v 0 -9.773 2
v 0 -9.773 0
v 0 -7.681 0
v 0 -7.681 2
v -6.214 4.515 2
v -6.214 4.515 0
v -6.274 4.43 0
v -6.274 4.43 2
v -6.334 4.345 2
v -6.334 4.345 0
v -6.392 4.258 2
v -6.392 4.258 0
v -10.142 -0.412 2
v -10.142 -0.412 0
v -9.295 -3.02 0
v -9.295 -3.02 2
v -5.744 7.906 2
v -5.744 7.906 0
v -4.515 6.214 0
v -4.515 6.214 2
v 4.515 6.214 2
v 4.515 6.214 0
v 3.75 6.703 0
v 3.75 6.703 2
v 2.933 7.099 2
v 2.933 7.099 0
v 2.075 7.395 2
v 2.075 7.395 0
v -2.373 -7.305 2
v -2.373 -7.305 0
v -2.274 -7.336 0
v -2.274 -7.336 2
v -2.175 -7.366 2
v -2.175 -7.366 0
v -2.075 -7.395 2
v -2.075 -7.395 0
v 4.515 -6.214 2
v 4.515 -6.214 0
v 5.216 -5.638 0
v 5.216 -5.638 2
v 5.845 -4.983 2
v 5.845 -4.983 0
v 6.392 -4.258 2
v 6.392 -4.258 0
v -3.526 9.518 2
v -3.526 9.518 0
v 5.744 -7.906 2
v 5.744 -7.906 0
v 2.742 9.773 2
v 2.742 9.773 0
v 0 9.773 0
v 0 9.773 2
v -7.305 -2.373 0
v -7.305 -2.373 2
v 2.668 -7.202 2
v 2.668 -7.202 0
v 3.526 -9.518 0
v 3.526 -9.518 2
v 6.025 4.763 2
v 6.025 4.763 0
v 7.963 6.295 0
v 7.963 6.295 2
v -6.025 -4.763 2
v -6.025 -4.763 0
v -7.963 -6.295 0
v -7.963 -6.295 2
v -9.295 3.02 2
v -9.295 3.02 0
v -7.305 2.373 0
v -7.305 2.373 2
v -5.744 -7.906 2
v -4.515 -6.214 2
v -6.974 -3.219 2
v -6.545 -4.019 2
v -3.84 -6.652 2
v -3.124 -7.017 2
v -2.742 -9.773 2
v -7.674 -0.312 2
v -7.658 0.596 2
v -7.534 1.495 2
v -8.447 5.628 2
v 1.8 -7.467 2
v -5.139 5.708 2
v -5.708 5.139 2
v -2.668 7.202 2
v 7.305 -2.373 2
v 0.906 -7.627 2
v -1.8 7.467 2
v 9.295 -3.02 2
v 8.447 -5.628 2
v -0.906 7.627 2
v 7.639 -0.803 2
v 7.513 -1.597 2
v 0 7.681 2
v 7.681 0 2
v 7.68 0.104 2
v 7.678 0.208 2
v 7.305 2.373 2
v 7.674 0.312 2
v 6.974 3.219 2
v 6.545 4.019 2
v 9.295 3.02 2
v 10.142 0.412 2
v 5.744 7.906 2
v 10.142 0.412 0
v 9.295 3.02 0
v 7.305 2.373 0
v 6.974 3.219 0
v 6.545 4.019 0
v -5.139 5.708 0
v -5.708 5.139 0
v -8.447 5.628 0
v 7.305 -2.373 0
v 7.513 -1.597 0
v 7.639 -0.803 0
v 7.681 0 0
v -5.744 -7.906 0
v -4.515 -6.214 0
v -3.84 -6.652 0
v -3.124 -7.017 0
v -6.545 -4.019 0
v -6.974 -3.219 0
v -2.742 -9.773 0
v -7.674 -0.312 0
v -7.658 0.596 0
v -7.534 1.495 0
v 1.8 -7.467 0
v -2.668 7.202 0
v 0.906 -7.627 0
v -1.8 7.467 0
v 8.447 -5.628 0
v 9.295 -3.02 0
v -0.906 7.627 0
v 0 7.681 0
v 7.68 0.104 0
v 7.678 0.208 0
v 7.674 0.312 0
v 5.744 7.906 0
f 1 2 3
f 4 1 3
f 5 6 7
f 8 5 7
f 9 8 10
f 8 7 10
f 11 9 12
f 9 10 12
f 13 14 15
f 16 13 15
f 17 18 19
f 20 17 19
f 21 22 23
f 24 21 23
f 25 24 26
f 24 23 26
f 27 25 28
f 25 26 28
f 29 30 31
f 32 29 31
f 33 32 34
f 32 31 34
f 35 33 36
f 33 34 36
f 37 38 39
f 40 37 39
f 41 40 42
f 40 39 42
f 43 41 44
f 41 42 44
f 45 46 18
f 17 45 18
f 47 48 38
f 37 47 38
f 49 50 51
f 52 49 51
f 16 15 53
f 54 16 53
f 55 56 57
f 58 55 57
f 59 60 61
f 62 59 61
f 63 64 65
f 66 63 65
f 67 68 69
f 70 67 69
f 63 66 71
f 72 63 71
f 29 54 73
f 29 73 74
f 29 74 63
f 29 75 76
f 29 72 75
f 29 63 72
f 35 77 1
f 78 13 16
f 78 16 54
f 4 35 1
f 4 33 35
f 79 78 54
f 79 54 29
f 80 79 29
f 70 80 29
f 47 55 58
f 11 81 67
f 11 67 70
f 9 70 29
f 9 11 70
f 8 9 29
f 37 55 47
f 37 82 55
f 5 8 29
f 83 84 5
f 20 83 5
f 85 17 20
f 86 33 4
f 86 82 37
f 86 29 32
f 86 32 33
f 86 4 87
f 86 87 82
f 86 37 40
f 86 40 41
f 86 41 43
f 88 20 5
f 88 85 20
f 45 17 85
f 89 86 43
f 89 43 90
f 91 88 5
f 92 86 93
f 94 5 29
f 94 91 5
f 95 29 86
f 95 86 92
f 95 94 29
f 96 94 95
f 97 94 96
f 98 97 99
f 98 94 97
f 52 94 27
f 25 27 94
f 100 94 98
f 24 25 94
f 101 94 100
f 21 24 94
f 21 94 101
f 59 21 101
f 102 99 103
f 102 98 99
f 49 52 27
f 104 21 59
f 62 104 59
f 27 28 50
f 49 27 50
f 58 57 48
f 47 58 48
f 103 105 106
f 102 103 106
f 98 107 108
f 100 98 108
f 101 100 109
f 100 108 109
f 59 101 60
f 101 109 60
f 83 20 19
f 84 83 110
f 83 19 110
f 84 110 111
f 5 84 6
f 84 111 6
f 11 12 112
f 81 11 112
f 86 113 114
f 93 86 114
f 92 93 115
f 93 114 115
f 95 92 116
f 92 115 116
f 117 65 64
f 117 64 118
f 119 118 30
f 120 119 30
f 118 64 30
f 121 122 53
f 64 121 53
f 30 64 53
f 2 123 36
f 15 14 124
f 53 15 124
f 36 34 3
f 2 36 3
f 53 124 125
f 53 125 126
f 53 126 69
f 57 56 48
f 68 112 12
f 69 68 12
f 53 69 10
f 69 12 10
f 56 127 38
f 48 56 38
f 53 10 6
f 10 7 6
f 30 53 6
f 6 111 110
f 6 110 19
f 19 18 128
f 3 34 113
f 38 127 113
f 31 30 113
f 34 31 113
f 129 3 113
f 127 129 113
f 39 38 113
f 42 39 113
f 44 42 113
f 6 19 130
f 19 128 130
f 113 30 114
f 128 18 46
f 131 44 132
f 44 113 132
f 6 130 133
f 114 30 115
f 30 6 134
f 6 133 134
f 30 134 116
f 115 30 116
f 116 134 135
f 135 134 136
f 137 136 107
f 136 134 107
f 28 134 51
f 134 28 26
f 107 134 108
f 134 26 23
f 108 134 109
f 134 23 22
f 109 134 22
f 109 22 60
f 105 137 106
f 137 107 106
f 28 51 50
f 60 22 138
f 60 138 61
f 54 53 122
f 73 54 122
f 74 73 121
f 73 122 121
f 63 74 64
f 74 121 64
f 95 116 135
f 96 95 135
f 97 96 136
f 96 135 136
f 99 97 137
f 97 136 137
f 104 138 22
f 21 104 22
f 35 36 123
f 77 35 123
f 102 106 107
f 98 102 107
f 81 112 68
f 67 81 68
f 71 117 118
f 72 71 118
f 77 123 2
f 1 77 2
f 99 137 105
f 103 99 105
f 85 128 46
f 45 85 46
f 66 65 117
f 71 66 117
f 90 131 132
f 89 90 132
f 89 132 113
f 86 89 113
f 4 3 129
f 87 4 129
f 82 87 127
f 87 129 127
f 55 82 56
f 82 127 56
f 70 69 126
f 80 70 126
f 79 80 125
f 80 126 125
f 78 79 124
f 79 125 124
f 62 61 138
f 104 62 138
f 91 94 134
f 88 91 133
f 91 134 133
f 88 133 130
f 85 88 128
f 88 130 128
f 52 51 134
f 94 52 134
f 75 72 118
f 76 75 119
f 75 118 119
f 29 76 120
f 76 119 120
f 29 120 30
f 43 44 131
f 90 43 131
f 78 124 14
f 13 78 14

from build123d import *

# Parameters (mm, degrees)
F1_DEPTH = 2
F2_COUNT = 10


with BuildPart() as f1:
    # F0 (on Top) → F1 (new body)
    with BuildSketch(Plane.XY):
        with BuildLine():
            ThreePointArc((0, 7.6807912749), (-5.4311395954, -5.4311395954), (7.6807912749, 0))
            ThreePointArc((7.6807912749, 0), (6.1208653438, 4.6399959108), (2.0747120882, 7.3952771659))
            Line((2.0747120882, 7.3952771659), (0, 0))
            Line((0, 0), (0, 7.6807912749))
        make_face()
        with BuildLine():
            Line((0, 0), (2.0747120882, 7.3952771659))
            ThreePointArc((2.0747120882, 7.3952771659), (1.0471328182, 7.6090779645), (0, 7.6807912749))
            Line((0, 7.6807912749), (0, 0))
        make_face()
        with BuildLine():
            ThreePointArc((0, 7.6807912749), (1.0471328182, 7.6090779645), (2.0747120882, 7.3952771659))
            Line((2.0747120882, 7.3952771659), (2.7417573147, 9.7729489207))
            Line((2.7417573147, 9.7729489207), (0, 9.7729489207))
            Line((0, 9.7729489207), (0, 7.6807912749))
        make_face()
    extrude(amount=F1_DEPTH)

    # F2: F1 ×10 about axis
    f2_axis = Axis((0, 0, 0), (0, 0, -1))


with BuildPart() as f1_1:
    add(f1.part)
    for i in range(1, F2_COUNT):
        add(f1.part.rotate(f2_axis, i * 360 / F2_COUNT))


solid = f1_1.part
